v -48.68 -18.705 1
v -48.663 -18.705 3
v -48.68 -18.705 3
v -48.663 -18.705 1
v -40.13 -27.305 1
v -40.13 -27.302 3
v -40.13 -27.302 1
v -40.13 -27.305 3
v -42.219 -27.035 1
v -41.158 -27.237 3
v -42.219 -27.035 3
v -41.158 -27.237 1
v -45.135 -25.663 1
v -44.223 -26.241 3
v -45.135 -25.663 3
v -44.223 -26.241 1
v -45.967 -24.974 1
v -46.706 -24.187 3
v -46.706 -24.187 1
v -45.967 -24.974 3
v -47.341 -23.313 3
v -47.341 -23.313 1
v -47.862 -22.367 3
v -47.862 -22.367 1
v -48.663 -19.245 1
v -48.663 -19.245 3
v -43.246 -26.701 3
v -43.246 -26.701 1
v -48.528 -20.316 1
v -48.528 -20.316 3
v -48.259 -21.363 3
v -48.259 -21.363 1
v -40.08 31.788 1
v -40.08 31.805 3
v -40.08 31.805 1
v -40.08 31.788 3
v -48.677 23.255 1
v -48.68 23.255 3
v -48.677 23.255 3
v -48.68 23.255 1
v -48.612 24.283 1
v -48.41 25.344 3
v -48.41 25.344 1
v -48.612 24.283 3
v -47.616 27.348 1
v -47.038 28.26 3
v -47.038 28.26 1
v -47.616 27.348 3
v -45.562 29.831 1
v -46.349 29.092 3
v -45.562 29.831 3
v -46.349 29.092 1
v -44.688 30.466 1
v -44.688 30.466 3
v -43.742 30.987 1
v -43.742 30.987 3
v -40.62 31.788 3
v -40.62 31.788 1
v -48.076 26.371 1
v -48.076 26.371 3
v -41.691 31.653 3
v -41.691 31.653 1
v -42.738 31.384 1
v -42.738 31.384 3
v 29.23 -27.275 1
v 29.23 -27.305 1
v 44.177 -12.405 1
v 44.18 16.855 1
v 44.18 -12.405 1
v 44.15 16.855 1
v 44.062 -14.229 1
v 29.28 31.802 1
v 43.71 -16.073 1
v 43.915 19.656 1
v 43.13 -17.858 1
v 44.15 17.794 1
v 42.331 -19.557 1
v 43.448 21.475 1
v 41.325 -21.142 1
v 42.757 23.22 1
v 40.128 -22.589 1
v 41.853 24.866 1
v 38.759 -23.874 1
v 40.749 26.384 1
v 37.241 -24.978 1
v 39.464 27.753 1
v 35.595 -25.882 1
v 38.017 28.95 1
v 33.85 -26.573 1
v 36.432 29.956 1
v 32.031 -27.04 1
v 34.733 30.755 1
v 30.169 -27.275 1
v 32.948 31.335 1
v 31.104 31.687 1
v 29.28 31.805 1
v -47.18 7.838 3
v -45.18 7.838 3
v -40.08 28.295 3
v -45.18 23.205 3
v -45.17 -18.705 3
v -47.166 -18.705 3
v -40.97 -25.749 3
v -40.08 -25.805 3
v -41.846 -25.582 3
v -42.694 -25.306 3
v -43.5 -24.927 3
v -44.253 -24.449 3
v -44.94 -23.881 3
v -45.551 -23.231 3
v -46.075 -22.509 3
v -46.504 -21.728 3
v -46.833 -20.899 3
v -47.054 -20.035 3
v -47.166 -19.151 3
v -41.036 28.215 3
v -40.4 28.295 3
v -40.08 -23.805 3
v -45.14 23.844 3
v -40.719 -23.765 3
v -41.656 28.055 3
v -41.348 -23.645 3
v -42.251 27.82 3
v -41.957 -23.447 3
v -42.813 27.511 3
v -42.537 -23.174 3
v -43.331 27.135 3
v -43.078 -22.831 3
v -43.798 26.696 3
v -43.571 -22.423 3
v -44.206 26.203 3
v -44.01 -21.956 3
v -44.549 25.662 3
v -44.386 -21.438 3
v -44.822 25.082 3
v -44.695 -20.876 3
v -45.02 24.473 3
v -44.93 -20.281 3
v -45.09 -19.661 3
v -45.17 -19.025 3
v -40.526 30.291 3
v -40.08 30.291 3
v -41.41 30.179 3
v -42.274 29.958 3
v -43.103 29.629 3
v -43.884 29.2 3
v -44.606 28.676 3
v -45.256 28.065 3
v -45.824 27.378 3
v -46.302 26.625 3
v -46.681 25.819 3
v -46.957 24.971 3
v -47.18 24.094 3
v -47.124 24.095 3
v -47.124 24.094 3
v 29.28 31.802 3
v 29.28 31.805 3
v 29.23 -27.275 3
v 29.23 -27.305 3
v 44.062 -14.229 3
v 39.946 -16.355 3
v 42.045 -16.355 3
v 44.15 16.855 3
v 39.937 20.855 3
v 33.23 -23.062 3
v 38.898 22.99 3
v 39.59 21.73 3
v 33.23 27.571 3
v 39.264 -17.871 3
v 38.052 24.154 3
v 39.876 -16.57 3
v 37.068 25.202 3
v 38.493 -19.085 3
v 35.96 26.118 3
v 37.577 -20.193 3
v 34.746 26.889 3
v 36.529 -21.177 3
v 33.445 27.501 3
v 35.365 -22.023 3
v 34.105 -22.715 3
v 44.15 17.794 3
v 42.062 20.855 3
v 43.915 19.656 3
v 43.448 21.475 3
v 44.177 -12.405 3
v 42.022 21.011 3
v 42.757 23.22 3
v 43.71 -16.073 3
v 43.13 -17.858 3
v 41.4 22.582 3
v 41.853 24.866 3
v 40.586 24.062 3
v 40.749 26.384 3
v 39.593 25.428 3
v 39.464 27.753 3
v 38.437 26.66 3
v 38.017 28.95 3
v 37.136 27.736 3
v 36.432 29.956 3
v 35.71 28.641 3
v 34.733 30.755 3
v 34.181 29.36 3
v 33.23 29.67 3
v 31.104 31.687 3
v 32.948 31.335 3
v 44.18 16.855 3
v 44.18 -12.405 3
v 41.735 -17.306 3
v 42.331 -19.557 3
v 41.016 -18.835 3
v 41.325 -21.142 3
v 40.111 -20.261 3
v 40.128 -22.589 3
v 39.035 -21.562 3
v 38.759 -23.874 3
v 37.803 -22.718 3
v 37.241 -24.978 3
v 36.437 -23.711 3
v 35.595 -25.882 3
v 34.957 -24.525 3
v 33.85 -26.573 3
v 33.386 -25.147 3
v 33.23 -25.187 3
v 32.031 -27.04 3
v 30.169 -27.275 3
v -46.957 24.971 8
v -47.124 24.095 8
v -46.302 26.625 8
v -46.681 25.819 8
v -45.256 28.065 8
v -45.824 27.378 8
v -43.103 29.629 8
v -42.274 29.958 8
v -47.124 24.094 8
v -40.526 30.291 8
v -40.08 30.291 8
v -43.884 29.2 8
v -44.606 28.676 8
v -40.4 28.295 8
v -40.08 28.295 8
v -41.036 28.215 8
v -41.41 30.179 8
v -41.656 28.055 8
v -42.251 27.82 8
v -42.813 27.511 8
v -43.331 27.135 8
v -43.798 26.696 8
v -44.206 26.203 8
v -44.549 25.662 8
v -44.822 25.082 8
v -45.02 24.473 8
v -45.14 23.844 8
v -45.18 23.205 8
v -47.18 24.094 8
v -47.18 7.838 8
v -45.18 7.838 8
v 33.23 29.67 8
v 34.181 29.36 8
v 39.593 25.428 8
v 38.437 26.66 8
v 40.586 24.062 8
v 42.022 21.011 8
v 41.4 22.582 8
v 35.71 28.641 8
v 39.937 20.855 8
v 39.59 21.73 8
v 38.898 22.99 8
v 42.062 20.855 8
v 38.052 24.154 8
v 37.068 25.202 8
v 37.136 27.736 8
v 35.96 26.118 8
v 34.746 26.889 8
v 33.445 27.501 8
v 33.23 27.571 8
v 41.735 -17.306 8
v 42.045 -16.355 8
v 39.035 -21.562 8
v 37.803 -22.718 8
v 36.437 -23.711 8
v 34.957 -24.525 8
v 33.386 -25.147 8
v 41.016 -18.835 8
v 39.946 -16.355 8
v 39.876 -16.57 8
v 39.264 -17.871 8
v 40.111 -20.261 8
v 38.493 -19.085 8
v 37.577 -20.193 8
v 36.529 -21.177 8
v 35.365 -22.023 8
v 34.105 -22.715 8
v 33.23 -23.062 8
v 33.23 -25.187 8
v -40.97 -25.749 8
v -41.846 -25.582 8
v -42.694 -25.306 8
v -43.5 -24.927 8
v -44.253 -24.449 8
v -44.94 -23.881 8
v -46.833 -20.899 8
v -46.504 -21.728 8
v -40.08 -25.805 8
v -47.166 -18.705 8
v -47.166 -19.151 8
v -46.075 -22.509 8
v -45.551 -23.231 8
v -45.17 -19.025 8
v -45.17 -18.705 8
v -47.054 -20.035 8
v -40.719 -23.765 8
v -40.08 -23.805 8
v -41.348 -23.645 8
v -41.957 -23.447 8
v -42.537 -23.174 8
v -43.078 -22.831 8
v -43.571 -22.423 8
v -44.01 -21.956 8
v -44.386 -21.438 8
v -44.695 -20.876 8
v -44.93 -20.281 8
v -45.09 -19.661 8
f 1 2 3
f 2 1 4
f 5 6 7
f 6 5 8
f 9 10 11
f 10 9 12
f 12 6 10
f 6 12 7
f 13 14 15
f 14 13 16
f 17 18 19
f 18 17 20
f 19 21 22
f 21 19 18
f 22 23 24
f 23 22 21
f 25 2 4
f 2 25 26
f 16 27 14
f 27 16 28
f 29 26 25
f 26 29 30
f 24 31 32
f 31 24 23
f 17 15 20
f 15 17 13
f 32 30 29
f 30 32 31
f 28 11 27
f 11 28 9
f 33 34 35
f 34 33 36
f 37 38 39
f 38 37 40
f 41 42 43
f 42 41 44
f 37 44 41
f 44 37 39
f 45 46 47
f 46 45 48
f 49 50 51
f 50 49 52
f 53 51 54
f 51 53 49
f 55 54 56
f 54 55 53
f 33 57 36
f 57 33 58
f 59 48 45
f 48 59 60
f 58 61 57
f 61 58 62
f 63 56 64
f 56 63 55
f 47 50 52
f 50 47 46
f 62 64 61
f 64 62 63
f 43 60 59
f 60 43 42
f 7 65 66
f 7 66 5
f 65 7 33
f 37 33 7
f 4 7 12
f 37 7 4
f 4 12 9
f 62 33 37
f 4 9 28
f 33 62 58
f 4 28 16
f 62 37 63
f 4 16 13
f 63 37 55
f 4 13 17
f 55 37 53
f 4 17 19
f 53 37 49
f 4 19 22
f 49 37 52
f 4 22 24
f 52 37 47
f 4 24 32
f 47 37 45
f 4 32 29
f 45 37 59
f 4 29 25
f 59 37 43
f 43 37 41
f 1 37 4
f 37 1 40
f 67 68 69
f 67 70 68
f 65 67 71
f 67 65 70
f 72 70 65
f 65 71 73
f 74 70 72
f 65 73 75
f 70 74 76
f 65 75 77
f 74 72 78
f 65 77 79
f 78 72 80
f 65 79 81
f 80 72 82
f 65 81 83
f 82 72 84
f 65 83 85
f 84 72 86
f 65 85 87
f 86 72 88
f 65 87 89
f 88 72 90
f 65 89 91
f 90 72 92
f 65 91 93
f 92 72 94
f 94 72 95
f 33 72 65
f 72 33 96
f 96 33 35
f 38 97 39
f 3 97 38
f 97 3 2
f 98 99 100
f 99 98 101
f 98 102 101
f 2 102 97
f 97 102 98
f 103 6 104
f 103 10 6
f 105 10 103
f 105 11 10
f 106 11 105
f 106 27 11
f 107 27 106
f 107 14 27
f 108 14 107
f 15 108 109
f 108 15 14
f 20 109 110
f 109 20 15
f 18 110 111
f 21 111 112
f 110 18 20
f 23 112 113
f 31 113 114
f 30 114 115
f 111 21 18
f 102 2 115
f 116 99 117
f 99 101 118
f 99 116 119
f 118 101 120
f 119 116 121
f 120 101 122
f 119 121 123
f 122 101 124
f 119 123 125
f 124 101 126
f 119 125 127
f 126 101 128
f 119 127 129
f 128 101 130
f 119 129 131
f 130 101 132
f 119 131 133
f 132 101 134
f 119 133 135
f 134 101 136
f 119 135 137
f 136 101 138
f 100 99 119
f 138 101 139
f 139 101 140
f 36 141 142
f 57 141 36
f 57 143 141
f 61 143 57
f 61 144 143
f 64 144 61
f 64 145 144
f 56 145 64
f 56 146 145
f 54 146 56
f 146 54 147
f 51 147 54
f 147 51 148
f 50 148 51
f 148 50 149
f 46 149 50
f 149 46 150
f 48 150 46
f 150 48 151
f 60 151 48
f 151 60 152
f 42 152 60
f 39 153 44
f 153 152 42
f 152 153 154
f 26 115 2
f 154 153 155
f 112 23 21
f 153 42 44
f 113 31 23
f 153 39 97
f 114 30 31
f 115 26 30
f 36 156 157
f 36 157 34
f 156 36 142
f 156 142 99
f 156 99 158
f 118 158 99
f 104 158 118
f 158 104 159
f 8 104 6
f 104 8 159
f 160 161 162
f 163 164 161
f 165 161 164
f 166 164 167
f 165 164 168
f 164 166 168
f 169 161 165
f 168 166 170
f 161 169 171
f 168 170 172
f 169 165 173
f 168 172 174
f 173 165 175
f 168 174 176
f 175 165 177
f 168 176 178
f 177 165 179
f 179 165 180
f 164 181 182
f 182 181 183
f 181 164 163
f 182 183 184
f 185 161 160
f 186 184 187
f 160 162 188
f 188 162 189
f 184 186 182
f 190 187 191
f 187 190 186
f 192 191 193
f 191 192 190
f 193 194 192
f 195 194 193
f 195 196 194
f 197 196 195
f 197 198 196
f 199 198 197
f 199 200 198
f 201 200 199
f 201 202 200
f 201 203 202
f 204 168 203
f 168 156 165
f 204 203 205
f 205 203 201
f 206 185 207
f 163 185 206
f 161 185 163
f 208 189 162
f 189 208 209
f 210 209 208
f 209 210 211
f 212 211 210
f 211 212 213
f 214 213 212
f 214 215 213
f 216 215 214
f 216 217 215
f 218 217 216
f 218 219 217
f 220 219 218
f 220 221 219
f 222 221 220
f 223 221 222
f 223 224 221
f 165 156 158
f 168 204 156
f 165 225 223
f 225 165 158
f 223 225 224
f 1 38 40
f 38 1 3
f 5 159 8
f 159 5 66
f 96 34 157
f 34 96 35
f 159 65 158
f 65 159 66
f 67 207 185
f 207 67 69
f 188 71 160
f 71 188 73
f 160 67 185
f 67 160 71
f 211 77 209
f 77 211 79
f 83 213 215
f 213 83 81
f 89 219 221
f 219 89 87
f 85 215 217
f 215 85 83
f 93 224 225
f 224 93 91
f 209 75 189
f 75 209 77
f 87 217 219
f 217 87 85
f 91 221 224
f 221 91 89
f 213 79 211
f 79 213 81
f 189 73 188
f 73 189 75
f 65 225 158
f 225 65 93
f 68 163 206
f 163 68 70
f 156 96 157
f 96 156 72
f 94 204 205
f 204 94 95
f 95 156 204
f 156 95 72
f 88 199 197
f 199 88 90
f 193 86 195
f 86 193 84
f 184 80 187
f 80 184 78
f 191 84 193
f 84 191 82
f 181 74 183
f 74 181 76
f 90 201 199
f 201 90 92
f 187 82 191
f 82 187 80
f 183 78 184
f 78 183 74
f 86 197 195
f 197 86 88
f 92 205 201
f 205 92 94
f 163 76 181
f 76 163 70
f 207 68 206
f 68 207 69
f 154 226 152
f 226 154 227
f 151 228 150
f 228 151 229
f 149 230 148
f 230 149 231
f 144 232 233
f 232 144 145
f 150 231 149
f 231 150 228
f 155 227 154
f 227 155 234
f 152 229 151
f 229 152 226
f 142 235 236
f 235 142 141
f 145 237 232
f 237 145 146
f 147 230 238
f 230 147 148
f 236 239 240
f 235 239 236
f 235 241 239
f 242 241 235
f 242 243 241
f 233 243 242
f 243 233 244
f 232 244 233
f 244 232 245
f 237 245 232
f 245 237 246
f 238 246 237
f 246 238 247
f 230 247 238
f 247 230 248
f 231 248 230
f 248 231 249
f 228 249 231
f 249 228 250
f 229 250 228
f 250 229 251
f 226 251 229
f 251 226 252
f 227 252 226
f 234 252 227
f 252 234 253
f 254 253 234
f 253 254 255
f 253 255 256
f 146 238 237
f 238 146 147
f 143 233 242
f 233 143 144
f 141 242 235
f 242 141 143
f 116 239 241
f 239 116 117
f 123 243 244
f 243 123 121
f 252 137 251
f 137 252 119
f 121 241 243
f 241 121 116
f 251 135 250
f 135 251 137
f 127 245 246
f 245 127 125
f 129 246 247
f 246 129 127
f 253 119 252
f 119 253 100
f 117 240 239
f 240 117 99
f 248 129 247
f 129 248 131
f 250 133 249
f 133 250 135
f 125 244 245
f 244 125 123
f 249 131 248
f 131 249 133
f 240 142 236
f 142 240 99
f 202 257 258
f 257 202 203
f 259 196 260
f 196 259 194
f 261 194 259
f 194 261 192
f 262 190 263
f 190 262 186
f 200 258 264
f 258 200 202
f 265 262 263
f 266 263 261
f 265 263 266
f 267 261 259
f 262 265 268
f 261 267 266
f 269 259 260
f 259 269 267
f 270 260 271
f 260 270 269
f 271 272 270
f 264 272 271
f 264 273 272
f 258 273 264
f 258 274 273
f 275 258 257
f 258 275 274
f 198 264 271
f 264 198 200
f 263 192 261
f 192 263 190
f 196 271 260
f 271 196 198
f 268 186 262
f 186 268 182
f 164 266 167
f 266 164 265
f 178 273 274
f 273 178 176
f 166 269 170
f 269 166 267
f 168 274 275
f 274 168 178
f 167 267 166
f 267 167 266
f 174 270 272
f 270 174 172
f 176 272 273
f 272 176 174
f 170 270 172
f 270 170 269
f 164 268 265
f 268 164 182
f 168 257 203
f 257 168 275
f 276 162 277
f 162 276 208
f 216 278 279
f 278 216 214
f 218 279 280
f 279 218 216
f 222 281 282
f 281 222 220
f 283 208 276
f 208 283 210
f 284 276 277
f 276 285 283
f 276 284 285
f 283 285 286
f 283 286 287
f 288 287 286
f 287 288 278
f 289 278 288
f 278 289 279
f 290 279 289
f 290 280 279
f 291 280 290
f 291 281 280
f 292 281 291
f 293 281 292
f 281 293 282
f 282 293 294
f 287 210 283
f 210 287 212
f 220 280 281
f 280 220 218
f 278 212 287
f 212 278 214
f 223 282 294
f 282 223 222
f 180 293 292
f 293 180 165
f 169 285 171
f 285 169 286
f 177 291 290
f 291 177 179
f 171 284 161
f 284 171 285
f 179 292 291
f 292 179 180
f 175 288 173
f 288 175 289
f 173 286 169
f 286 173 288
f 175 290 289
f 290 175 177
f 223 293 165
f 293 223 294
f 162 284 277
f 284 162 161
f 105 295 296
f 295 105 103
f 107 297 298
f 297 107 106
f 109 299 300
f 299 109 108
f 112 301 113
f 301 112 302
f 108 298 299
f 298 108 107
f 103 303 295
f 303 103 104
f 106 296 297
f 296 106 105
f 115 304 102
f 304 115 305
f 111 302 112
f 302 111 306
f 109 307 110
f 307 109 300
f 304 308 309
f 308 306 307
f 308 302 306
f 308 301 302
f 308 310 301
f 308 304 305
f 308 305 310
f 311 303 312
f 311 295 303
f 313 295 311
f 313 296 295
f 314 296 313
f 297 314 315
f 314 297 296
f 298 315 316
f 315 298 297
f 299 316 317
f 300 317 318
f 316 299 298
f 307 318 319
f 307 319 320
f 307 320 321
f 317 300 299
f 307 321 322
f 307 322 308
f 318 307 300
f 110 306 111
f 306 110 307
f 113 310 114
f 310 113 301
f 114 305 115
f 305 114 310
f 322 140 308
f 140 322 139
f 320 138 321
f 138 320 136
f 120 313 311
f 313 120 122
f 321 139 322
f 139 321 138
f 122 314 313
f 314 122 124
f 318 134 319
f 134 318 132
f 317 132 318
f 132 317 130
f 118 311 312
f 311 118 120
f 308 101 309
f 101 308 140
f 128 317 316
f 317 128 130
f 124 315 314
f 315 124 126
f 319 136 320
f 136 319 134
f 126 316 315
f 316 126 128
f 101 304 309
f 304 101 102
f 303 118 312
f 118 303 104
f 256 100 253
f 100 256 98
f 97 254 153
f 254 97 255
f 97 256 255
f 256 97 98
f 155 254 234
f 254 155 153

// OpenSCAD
// file: BBB_SlimCase_v2_Library.scad
// ******************************************
// Beaglebone Black Slim Case Library
// Functions and Constants
// By Isaac Hayes
// Copyright 2014
// http://scuttlebots.com
//
// This program is free software; you can redistribute it and/or modify
// it under the terms of the GNU General Public License as published by
// the Free Software Foundation; either version 2 of the License, or
// (at your option) any later version.
//
// This program is distributed in the hope that it will be useful,
// but WITHOUT ANY WARRANTY; without even the implied warranty of
// MERCHANTABILITY or FITNESS FOR A PARTICULAR PURPOSE.  See the
// GNU General Public License for more details.
//
// You should have received a copy of the GNU General Public License along
// with this program; if not, write to the Free Software Foundation, Inc.,
// 51 Franklin Street, Fifth Floor, Boston, MA 02110-1301 USA.
// ******************************************

// ************************************
// Dimensions and Locations Math(s)
// ************************************

// -All dimensions in millimeters
// -Origin at bottom left corner of PCB
// -Ethernet and power jack face left closest to origin
// -X and Y refer to position of lower left corner of compoenent from origin
// -Z refers to distance from top of component to the PCB
// -L and W are Lenght(X) and Width(Y) to specify component size

//Board Dimensions
BB_L = 86.36;
BB_W = 54.61;
BB_Z = 1.65;
BB_SmCurve_R = 6.35;
BB_LgCurve_R = 12.70;

//Mounting Hole Locations (Clockwise from Bottom)
BB_Hole1X = 14.61;
BB_Hole1Y = 3.18;

BB_Hole2X = 14.61;
BB_Hole2Y = BB_Hole1Y + 48.39;

BB_Hole3X = BB_Hole1X + 66.10;
BB_Hole3Y = 6.35 + 41.91;

BB_Hole4X = BB_Hole1X + 66.10;
BB_Hole4Y = 6.35;

BB_Hole_ID = 2.75;
BB_Hole_OD = 5.5;
BB_Hole_Screw = 1.8;
//Pin Headers
BB_P9_X = 18.415;
BB_P9_Y = 0.635;
BB_P9_Z = 8.60;
BB_P9_L = 58.42;
BB_P9_W = 5.08;

BB_P8_X = 18.415;
BB_P8_Y = 48.895;
BB_P8_Z = 8.60;
BB_P8_L = 58.42;
BB_P8_W = 5.08;

//Capacitor
BB_Cap_X = 65.00;
BB_Cap_Y = 8.00;
BB_Cap_Z = 11.00;
BB_Cap_L = 6.00;
BB_Cap_W = 6.00;

//Power jack
BB_PJack_X = -2.54;
BB_PJack_Y = 5.461;
BB_PJack_Z = 10.75;
BB_PJack_L = 14.15;
BB_PJack_W = 9.00;

//Ethernet jack
BB_Eth_X = -2.54;
BB_Eth_Y = 21.717;
BB_Eth_Z = 13.33;
BB_Eth_L = 21.00;
BB_Eth_W = 16.10;

//Usb Host Port
BB_USBH_X = BB_L - 14.05;
BB_USBH_Y = 10.287 - 0.5;
BB_USBH_Z = 6.95;
BB_USBH_L = 14.05;
BB_USBH_W = 14.45 - 1.50;

//USB Mini Device Port
BB_USBD_X = -1.635;
BB_USBD_Y = 40.005 + 0.60;
BB_USBD_Z = 4.00;
BB_USBD_L = 6.91;
BB_USBD_W = 7.747;

//Micro HDMI port
BB_HDMI_X = BB_L + 0.635 - 7.50;
BB_HDMI_Y = 21.59 + 0.1;
BB_HDMI_Z = 2.90;
BB_HDMI_L = 7.50;
BB_HDMI_W = 6.55;

//MicroSD Card Port (Slot only)
BB_SD_X = BB_L - 14.90;
BB_SD_Y = 30.607 + 0.5;
BB_SD_Z = 1.75 - 0.5;
BB_SD_L = 14.90;
BB_SD_W = 11.05;

// Temperature Port
BB_TEMP_X = BB_L - 5.0;
BB_TEMP_W = 10.0;
BB_TEMP_D = 5;
BB_TEMP_Z = 10;
BB_TEMP1_Y = 27;
BB_TEMP2_Y = BB_TEMP1_Y + (2.54 * 3.0 );
BB_TEMP3_Y = BB_TEMP2_Y + (2.54 * 3.0);

// Servo Port
BB_SERVO_X = BB_L - 5.0;
BB_SERVO_Y = 7.1;
BB_SERVO_Z = 9.5;
BB_SERVO_H = 3;
BB_SERVO_W = 14.5;
// Fan Port
BB_FAN_X = 54.0;
BB_FAN_Y = BB_W;
BB_FAN_Z = 21.5;
BB_FAN_D = 4.5;

BB_ADD_Z = 17.0;
AdditionalSDCard_Space = 2.0;

//CASE DIMENSIONS
//Outer Shell
Case_Thickness = 1.50;     //Wall Thickness
Case_Gap = 0.75;  //Gap between case walls and board
Case_L = AdditionalSDCard_Space + BB_L + Case_Thickness*2 + Case_Gap*2;
Case_W = BB_W + Case_Thickness*2 + Case_Gap*2;
Case_SmCurve_R = BB_SmCurve_R + Case_Thickness + Case_Gap;
Case_LgCurve_R = BB_LgCurve_R + Case_Thickness + Case_Gap;
Case_PCB_Z = BB_USBD_Z + 1.00;      //Height PCB is suspended above case floor
Case_Z = Case_Thickness + Case_PCB_Z + BB_Z + BB_P9_Z + BB_ADD_Z;      //Total height of case
Cmp_Gap = 0.25;      //Gap around components
Cmp_Gap2 = Cmp_Gap*2;   //Gap around components times two

//Shell hollow inside dimensions
CutOut_L = AdditionalSDCard_Space + BB_L + Case_Gap*2;
CutOut_W = BB_W + Case_Gap*2;
CutOut_SmCurve_R = BB_SmCurve_R + Case_Gap;
CutOut_LgCurve_R = BB_LgCurve_R + Case_Gap;
CutOut_Z = Case_Z - Case_Thickness;

//Lid Dimensions
Lid_Thickness = 2.00;
Lid_Grip_Thickness = 2.00;
Lid_Grip_Z = 5.00;
Lid_Grip_SmR = Case_SmCurve_R - Case_Thickness;
Lid_Grip_LgR = Case_LgCurve_R - Case_Thickness;

//Dev Station Rail Dimensions
DSR_L = Case_L - Case_LgCurve_R - Case_SmCurve_R;
DSR_W = 2.0;
DSR_H = 3.0;
DSRH_W = 4.0;

// ************************************
// cornerRoundedCube Module - See source below
// ************************************

// http://codeviewer.org/view/code:1b36 
// Copyright (C) 2011 Sergio Vilches
// This program is free software: you can redistribute it and/or modify it under the terms of the GNU General Public License as published by the Free Software Foundation, either version 3 of the License, or (at your option) any later version.
// This program is distributed in the hope that it will be useful, but WITHOUT ANY WARRANTY; without even the implied warranty of MERCHANTABILITY or FITNESS FOR A PARTICULAR PURPOSE. See the GNU General Public License for more details. You should have received a copy of the GNU General Public License along with this program. If not, see <http://www.gnu.org/licenses/>.
// Contact: s.vilches.e@gmail.com


//     ----------------------------------------------------------- 
//                  Round Corners Cube (Extruded)                
//       roundCornersCube(x,y,z,r) Where:                        
//          - x = Xdir width                                     
//          - y = Ydir width                                     
//          - z = Height of the cube                             
//          - r = Rounding radious                               
                                                              
//       Example: roundCornerCube(10,10,2,1);                    
//      *Some times it's needed to use F6 to see good results!   
//  	 ----------------------------------------------------------- 

// Code was modified to not use centered cubes - Isaac


module createMeniscus(h,radius) // This module creates the shape that needs to be substracted from a cube to make its corners rounded.
difference(){        //This shape is basicly the difference between a quarter of cylinder and a cube
   translate([radius/2+0.1,radius/2+0.1,0]){
      cube([radius+0.2,radius+0.1,h+0.2],center=true);         // All that 0.x numbers are to avoid "ghost boundaries" when substracting
   }

   cylinder(h=h+0.2,r=radius,$fn = 50,center=true);
}


module roundCornersCube(x,y,z,r)  // Now we just substract the shape we have created in the four corners
difference(){
   cube([x,y,z], center=false);

   translate([x-r,y-r,z/2]){  // We move to the first corner (x,y)
      rotate(0){  
         createMeniscus(z,r); // And substract the meniscus
      }
   }
   translate([r,y-r,z/2]){ // To the second corner (-x,y)
      rotate(90){
         createMeniscus(z,r); // But this time we have to rotate the meniscus 90 deg
      }
   }
   translate([r,r,z/2]){ // ... 
      rotate(180){
         createMeniscus(z,r);
      }
   }
   translate([x-r,r,z/2]){
      rotate(270){
         createMeniscus(z,r);
      }
   }
}
// main file
// ******************************************
// Beaglebone Black Slim Case
// By Isaac Hayes
// Copyright 2014
// http://scuttlebots.com
//
// This program is free software; you can redistribute it and/or modify
// it under the terms of the GNU General Public License as published by
// the Free Software Foundation; either version 2 of the License, or
// (at your option) any later version.
//
// This program is distributed in the hope that it will be useful,
// but WITHOUT ANY WARRANTY; without even the implied warranty of
// MERCHANTABILITY or FITNESS FOR A PARTICULAR PURPOSE.  See the
// GNU General Public License for more details.
//
// You should have received a copy of the GNU General Public License along
// with this program; if not, write to the Free Software Foundation, Inc.,
// 51 Franklin Street, Fifth Floor, Boston, MA 02110-1301 USA.
// ******************************************

// ************************************
// Render Options
// ************************************

// RENDER OPTIONS
// Set this variable to output the piece you want
// 0 - No Render
// 1 - Visual Only render
// 2 - Base for STL Export
// 3 - Lid for STL Export

   Render_Options = 3;

// LID OPTIONS
// Set this to select various lid Options
// 0 = Solid
// 1 = Pin Header Cut Outs

   Lid_Options = 0;

// DEV STATION OPTIONS
// Set this to add bottom rails for attachment to the BBB Dev Station Sled accessory
// 0 = Case Only
// 1 = Include rails

	DevRails_Options = 0;

    Ethernet_Port = 0;
    USB_Host_Port = 0;
    USB_Device_Port = 1;
    SDCARD_Port = 1;
    HDMI_Port = 0;
// ************************************
// Include External Libraries
// ************************************

// 
include <BBB_SlimCase_v2_Library.scad>

// ************************************
// Dimensions and Locations Math(s)
// ************************************

// -All dimensions in millimeters
// -Origin at bottom left corner of PCB
// -Ethernet and power jack face left closest to origin
// -X and Y refer to position of lower left corner of compoenent from origin
// -Z refers to distance from top of component to the PCB
// -L and W are Lenght(X) and Width(Y) to specify component size


// ************************************
// Components
// ************************************

module Base()
{
	union() {
	difference() {
		//Outer Shell of Case (Join two cubes together with different corner radii to achieve different size corners on each end)
		translate([-Case_Thickness-Case_Gap, -Case_Thickness-Case_Gap, -Case_Thickness]) {
		union() {
			roundCornersCube(Case_L-Case_LgCurve_R, Case_W, Case_Z, Case_SmCurve_R);
			translate ([Case_SmCurve_R,0,0]) roundCornersCube(Case_L-Case_SmCurve_R, Case_W, Case_Z, Case_LgCurve_R);
		}}
		
		//Hollow Out Inside of Case
		translate([-Case_Gap,-Case_Gap,0]) {
		union() {
			roundCornersCube(CutOut_L-CutOut_LgCurve_R, CutOut_W, CutOut_Z, CutOut_SmCurve_R);
			translate ([CutOut_SmCurve_R,0,0]) roundCornersCube(CutOut_L-CutOut_SmCurve_R, CutOut_W, CutOut_Z, CutOut_LgCurve_R);
		}}
		
		//Components Cutouts

		//Ethernet Jack
    if (Ethernet_Port == 1) {
		translate([BB_Eth_X-Cmp_Gap-Case_Thickness+0.5, BB_Eth_Y-Cmp_Gap, Case_PCB_Z+BB_Z]) cube([BB_Eth_L+Cmp_Gap2+Case_Thickness+0.5, BB_Eth_W+Cmp_Gap2, BB_Eth_Z+Cmp_Gap]);
    }
		//Power Jack
		translate([BB_PJack_X-Cmp_Gap-Case_Thickness+0.5, BB_PJack_Y-Cmp_Gap, Case_PCB_Z+BB_Z]) cube([BB_PJack_L+Cmp_Gap2+Case_Thickness+0.5, BB_PJack_W+Cmp_Gap2, BB_PJack_Z+Cmp_Gap]);
		//USB Device Port
    if (USB_Device_Port == 1) {
		translate([BB_USBD_X-Cmp_Gap-Case_Thickness+0.5, BB_USBD_Y-Cmp_Gap, 0.75]) cube([BB_USBD_L+Cmp_Gap2+Case_Thickness+0.5, BB_USBD_W+Cmp_Gap2, BB_USBD_Z+Cmp_Gap]);
    }
		//USB Host
    if (USB_Host_Port == 1) {
		translate([BB_USBH_X-Cmp_Gap, BB_USBH_Y-Cmp_Gap, Case_PCB_Z+BB_Z]) cube([BB_USBH_L+Cmp_Gap2+Case_Thickness+0.5, BB_USBH_W+Cmp_Gap2, CutOut_Z]);//BB_USBH_Z+Cmp_Gap]);
    }
    
    // 3x temp sensors
    translate([BB_TEMP_X-Cmp_Gap+AdditionalSDCard_Space, BB_TEMP1_Y, Case_PCB_Z+BB_TEMP_Z]) {
        rotate([0,90,0.0]) {
           cylinder(h=10, d=BB_TEMP_D, $fn=25);
        }
    }
    translate([BB_TEMP_X-Cmp_Gap+AdditionalSDCard_Space, BB_TEMP2_Y, Case_PCB_Z+BB_TEMP_Z]) {
        rotate([0,90,0.0]) {
           cylinder(h=10, d=BB_TEMP_D, $fn=25);
        }
    }
    translate([BB_TEMP_X-Cmp_Gap+AdditionalSDCard_Space, BB_TEMP3_Y, Case_PCB_Z+BB_TEMP_Z]) {
        rotate([0,90,0.0]) {
           cylinder(h=10, d=BB_TEMP_D, $fn=25);
        }
    }
     
    // servo connector
    translate([BB_SERVO_X-Cmp_Gap+AdditionalSDCard_Space, BB_SERVO_Y-Cmp_Gap, Case_PCB_Z+BB_SERVO_Z]) cube([10+Cmp_Gap2+Case_Thickness+0.5, BB_SERVO_W+Cmp_Gap2, BB_SERVO_H+Cmp_Gap2]);
    
    // fan output
    translate([BB_FAN_X+Cmp_Gap, BB_FAN_Y, Case_PCB_Z+BB_FAN_Z]) {
        rotate([-90,0,0.0]) {
            cylinder(h=5, d=BB_TEMP_D, $fn=25);
        }
    }
    
    
		//SD Card
    if (SDCARD_Port == 1) {
    translate([BB_SD_X-Cmp_Gap+AdditionalSDCard_Space, BB_SD_Y-Cmp_Gap, Case_PCB_Z-BB_SD_Z]) cube([BB_SD_L+Cmp_Gap2+Case_Thickness+0.5, BB_SD_W+Cmp_Gap2, BB_SD_Z+2*Cmp_Gap2]);
    }
		//HDMI
    if (HDMI_Port == 1) {
		translate([BB_HDMI_X-Cmp_Gap, BB_HDMI_Y-Cmp_Gap, Case_PCB_Z-BB_HDMI_Z]) cube([BB_HDMI_L+Cmp_Gap2+Case_Thickness+0.5, BB_HDMI_W+Cmp_Gap2, BB_HDMI_Z+Cmp_Gap2]);
    }
	}
		//Mounting pegs
		translate([BB_Hole1X,BB_Hole1Y,0]) MountingPeg();
		translate([BB_Hole2X,BB_Hole2Y,0]) MountingPeg();
		translate([BB_Hole3X,BB_Hole3Y,0]) MountingPeg();
		translate([BB_Hole4X,BB_Hole4Y,0]) MountingPeg();

		//Dev Station rails
		if (DevRails_Options == 1) {
			translate([Case_SmCurve_R-Case_Thickness-Case_Gap,Case_W-Case_Thickness-Case_Gap,-Case_Thickness]) DevRail(DSR_L, DSR_W, DSR_H);
			translate([DSR_L+Case_SmCurve_R-Case_Thickness-Case_Gap,-Case_Thickness-Case_Gap,-Case_Thickness]) rotate([0,0,180]) {
				DevRail(DSR_L, DSR_W, DSR_H);
			}
		}

	}
}

module Lid()
{
	difference() {	
		translate([-Case_Thickness-Case_Gap, -Case_Thickness-Case_Gap, -Case_Thickness]) {
		union() {
			//
			translate([0,0,Case_Z]) roundCornersCube(Case_L-Case_LgCurve_R, Case_W, Lid_Thickness, Case_SmCurve_R);
			translate ([Case_SmCurve_R,0,Case_Z]) roundCornersCube(Case_L-Case_SmCurve_R, Case_W, Lid_Thickness, Case_LgCurve_R);

			//Lid Grips
			translate([Case_Thickness,Case_Thickness,Case_Z-Lid_Grip_Z]) CornerGrip(Lid_Grip_SmR,Lid_Grip_Thickness,Lid_Grip_Z,0,0);
			translate([Case_L-Case_Thickness,Case_Thickness,Case_Z-Lid_Grip_Z]) CornerGrip(Lid_Grip_LgR,Lid_Grip_Thickness,Lid_Grip_Z,90,4);
			translate([Case_L-Case_Thickness,Case_W-Case_Thickness,Case_Z-Lid_Grip_Z]) CornerGrip(Lid_Grip_LgR,Lid_Grip_Thickness,Lid_Grip_Z,180,4);
			translate([Case_Thickness,Case_W-Case_Thickness,Case_Z-Lid_Grip_Z]) CornerGrip(Lid_Grip_SmR,Lid_Grip_Thickness,Lid_Grip_Z,270,0);
			translate([Case_Thickness,BB_PJack_Y+Case_Thickness+Case_Gap,Case_Z-Lid_Grip_Z]) cube([Lid_Grip_Thickness, BB_Eth_Y-BB_PJack_Y, Lid_Grip_Z]);
		}}

		//Component Cutouts
		
		//Ethernet Jack
//		translate([BB_Eth_X-Cmp_Gap-1.25, BB_Eth_Y-Cmp_Gap, Case_PCB_Z+BB_Z]) cube([BB_Eth_L+Cmp_Gap2+1.25, BB_Eth_W+Cmp_Gap2, BB_Eth_Z+Cmp_Gap]);
		//Power Jack
//		translate([BB_PJack_X-Cmp_Gap-1.25, BB_PJack_Y-Cmp_Gap, Case_PCB_Z+BB_Z]) cube([BB_PJack_L+Cmp_Gap2+1.25, BB_PJack_W+Cmp_Gap2, BB_PJack_Z+Cmp_Gap]);
		//Pin Headers
		if (Lid_Options == 1) {
			translate([BB_P8_X-Cmp_Gap, BB_P8_Y-Cmp_Gap, 0]) cube([BB_P8_L+Cmp_Gap2, BB_P8_W +Cmp_Gap2, 75]);
			translate([BB_P9_X-Cmp_Gap, BB_P9_Y-Cmp_Gap, 0]) cube([BB_P9_L+Cmp_Gap2, BB_P9_W +Cmp_Gap2, 75]);
		}
		//Capacitor
//		translate([BB_Cap_X, BB_Cap_Y, Case_PCB_Z+BB_Z]) cube([BB_Cap_L, BB_Cap_W, BB_Cap_Z]);

		
	}
}

module MountingPeg()
{
    difference() {
        union() {
            cylinder(h=Case_PCB_Z, d=BB_Hole_OD, $fn=25);
            cylinder(h=Case_PCB_Z/2, d1=BB_Hole_OD*1.5, d2=BB_Hole_OD, $fn=25);
            //translate([0,0,Case_PCB_Z-0.1]) cylinder(h=BB_Z/2+0.1,d=BB_Hole_ID, $fn=25);
            //translate([0,0,Case_PCB_Z+BB_Z/2-0.1]) cylinder(h=BB_Z/2+0.1,d1=BB_Hole_ID, d2=BB_Hole_ID/2, $fn=25);
        }
        translate([0,0,0]) cylinder(h=Case_PCB_Z+BB_Z+0.1,d=BB_Hole_Screw, $fn=25);
    }
}

module CornerGrip(R,T,Z,D,CutOff)
{
	rotate([0,0,D]) {
		difference() {
			translate([R,R,0]) cylinder(r=R, h=Z, $fn=50);
			translate([R,R,0]) cylinder(r=R-T, h=Z, $fn=50);
			translate([R-CutOff,0,0]) cube([R*2+CutOff,R*2+CutOff,Z]);
			translate([0,R-CutOff,0]) cube([R*2+CutOff,R*2+CutOff,Z]);
		}
	}
}

module DevRail(X, Y, Z)
{
	SZ = Z * cos(45);
	union() {
		cube([X,Y,Z]);
		translate([0,Y,0]) rotate([45,0,0]) cube([X,SZ,SZ]);
	}
}

// ************************************
// Output Renders
// ************************************

color("Green"){
	render(convexity=4) {
		if (Render_Options == 1) {
			Base();
			translate([0,0,2]) Lid();
		}
		if (Render_Options == 2) {
			Base();
		}
		if (Render_Options == 3) {
			rotate([180,0,0]) translate([-Case_L/2,-Case_W/2,-Case_Z-Case_Thickness]) Lid();
		}
	}
}
